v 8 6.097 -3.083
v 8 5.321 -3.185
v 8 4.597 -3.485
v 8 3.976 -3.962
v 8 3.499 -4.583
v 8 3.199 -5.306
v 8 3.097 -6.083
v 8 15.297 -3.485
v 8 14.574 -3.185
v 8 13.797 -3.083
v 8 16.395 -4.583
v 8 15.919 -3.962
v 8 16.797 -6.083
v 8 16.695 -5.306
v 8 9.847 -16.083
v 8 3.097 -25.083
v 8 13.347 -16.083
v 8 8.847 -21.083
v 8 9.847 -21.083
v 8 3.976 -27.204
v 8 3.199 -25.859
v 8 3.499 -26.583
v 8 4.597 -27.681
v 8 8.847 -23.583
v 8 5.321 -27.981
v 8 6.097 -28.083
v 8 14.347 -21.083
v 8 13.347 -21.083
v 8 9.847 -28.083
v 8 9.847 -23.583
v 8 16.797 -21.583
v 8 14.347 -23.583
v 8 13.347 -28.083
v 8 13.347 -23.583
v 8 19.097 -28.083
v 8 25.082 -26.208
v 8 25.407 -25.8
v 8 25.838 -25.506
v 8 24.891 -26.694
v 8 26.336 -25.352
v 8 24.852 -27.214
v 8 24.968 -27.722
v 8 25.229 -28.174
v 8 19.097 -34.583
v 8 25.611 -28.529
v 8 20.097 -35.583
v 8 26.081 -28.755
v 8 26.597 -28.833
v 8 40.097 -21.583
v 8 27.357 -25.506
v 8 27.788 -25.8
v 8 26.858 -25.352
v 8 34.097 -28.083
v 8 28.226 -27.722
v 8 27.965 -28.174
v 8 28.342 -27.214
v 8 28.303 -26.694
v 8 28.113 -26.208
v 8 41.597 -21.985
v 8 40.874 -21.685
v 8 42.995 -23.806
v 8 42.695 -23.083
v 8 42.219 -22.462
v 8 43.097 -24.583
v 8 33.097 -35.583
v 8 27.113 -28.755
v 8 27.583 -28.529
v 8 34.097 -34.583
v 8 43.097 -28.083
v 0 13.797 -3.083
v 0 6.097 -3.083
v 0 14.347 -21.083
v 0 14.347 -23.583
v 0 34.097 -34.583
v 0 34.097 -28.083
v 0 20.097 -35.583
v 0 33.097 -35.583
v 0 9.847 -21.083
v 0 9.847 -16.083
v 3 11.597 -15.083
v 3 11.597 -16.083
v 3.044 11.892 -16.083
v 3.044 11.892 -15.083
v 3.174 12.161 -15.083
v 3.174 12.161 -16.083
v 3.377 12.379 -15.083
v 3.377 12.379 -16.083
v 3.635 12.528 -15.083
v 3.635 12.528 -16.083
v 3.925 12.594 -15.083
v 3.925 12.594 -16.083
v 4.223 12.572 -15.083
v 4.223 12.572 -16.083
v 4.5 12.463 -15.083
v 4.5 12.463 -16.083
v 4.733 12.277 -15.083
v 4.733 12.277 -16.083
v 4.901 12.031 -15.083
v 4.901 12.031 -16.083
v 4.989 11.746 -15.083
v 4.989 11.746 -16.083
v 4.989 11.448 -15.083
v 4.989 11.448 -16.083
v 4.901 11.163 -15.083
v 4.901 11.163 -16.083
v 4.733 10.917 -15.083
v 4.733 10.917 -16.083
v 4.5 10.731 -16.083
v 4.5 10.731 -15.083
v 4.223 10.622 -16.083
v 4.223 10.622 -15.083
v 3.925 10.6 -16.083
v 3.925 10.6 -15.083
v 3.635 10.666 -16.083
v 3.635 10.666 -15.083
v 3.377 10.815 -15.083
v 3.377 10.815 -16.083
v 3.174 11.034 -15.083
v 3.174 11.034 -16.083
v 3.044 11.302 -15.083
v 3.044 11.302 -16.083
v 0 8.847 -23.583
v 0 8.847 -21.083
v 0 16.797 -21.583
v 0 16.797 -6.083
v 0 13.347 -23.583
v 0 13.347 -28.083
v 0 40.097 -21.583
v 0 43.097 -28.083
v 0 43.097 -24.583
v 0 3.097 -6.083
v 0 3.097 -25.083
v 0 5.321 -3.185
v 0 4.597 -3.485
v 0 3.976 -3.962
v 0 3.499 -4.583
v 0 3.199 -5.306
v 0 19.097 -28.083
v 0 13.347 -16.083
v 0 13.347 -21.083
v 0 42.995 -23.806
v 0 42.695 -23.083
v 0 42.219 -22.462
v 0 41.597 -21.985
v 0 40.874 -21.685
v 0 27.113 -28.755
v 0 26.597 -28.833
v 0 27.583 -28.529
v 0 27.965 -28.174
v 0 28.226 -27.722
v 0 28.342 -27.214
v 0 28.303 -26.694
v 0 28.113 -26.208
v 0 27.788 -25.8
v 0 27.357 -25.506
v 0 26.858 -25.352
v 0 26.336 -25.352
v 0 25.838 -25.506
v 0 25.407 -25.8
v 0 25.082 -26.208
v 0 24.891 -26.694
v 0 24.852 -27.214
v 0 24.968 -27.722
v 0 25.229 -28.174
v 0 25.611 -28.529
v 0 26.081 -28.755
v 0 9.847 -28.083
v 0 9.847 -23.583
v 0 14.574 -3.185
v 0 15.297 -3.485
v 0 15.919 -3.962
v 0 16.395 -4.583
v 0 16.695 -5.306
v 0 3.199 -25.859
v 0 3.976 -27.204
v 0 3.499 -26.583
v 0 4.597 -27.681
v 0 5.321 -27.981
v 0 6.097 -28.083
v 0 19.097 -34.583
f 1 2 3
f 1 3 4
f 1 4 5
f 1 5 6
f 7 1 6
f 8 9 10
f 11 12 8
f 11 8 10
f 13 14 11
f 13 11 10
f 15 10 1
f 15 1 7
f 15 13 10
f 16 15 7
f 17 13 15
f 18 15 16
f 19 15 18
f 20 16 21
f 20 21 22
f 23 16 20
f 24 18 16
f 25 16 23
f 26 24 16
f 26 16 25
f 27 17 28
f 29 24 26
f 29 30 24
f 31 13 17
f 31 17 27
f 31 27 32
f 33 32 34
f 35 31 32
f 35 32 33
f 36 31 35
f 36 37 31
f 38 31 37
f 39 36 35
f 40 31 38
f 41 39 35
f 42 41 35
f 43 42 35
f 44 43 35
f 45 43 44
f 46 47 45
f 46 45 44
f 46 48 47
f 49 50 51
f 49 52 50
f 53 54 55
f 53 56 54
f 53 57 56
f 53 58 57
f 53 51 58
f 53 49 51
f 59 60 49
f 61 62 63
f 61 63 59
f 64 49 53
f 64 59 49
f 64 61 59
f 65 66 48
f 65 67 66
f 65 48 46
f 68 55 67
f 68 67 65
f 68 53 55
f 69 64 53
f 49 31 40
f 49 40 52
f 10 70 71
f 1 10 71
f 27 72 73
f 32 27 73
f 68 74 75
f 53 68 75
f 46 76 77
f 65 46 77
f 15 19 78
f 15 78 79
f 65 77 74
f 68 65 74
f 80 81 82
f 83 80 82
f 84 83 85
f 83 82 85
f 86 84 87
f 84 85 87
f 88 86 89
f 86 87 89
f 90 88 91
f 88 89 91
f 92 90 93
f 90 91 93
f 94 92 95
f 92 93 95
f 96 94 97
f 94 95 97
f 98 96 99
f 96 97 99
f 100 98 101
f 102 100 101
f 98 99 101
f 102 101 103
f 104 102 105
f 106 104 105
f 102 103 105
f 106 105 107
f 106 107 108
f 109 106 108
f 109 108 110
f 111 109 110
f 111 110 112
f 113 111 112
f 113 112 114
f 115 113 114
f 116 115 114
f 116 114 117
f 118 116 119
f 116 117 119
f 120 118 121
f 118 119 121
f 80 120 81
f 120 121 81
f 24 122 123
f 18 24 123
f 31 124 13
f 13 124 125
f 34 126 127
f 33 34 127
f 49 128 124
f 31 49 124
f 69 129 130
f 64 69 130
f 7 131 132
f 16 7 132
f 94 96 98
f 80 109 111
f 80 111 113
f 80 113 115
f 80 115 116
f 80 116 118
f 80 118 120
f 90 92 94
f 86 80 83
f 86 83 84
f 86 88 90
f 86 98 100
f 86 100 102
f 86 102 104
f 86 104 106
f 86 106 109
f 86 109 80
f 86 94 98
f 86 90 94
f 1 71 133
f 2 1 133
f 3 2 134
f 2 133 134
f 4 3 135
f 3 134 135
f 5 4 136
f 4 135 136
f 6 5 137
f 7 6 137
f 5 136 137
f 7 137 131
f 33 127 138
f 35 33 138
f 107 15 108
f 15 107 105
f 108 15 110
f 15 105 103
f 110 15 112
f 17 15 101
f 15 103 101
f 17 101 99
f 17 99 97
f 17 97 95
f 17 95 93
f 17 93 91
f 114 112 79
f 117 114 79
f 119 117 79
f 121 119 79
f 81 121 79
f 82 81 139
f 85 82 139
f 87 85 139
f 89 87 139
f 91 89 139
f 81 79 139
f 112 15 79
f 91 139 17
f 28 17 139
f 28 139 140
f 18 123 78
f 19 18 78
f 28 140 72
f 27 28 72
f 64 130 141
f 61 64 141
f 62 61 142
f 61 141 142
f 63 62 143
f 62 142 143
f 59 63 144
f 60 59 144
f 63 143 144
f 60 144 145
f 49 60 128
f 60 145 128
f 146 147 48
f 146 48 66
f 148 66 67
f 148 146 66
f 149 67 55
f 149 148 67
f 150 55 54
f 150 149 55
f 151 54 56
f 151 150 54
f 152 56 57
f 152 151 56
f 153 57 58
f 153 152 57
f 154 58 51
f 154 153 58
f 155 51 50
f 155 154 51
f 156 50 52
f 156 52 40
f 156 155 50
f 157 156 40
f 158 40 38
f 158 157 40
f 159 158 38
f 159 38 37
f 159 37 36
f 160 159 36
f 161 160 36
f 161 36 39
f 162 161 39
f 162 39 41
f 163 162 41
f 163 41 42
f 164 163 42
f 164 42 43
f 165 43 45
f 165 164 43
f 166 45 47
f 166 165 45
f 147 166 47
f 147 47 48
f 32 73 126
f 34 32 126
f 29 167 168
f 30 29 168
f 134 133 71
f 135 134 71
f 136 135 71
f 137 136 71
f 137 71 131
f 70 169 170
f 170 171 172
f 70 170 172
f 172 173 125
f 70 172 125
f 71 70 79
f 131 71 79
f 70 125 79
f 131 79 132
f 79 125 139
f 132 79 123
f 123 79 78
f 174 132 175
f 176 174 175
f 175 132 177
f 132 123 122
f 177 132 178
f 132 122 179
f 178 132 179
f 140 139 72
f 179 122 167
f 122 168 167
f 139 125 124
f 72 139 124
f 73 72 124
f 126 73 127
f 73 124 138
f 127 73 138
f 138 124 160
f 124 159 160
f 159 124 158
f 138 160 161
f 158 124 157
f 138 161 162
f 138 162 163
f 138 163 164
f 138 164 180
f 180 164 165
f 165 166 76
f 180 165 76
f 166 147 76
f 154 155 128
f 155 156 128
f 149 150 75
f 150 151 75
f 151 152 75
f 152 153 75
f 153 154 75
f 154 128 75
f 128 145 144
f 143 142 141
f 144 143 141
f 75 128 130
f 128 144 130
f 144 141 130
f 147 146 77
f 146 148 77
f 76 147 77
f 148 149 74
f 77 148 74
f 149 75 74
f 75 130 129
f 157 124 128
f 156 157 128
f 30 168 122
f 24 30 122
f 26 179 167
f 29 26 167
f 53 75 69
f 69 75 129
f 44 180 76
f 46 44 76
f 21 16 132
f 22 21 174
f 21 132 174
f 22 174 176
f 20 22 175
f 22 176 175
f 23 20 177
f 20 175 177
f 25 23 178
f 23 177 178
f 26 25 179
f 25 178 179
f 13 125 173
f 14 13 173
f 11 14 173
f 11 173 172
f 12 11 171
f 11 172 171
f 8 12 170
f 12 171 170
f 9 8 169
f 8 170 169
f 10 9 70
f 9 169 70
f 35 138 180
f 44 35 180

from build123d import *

# Parameters (mm, degrees)
SKETCH1_R      = 1.75
EXTRUDE1_DEPTH = 8
SKETCH2_R      = 1
EXTRUDE2_DEPTH = 1


with BuildPart() as part:
    # Sketch1 → Extrude1 (new body)
    with BuildSketch(Plane(origin=(0, 0, 0), x_dir=(0, 0, -1), z_dir=(1, 0, 0))):
        with BuildLine():
            Line((28.082940188, 19.097217002), (34.582940188, 19.097217002))
            Line((34.582940188, 19.097217002), (35.582940188, 20.097217002))
            Line((35.582940188, 20.097217002), (35.582940188, 33.097217002))
            Line((35.582940188, 33.097217002), (34.582940188, 34.097217002))
            Line((34.582940188, 34.097217002), (28.082940188, 34.097217002))
            Line((28.082940188, 34.097217002), (28.082940188, 43.097217002))
            Line((28.082940188, 43.097217002), (24.582940188, 43.097217002))
            ThreePointArc((24.582940188, 43.097217002), (22.461619844, 42.218537346), (21.582940188, 40.097217002))
            Line((21.582940188, 40.097217002), (21.582940188, 16.797217002))
            Line((21.582940188, 16.797217002), (6.082940188, 16.797217002))
            ThreePointArc((6.082940188, 16.797217002), (3.961619844, 15.918537346), (3.082940188, 13.797217002))
            Line((3.082940188, 13.797217002), (3.082940188, 6.097217002))
            ThreePointArc((3.082940188, 6.097217002), (3.961619844, 3.975896659), (6.082940188, 3.097217002))
            Line((6.082940188, 3.097217002), (25.082940188, 3.097217002))
            ThreePointArc((25.082940188, 3.097217002), (27.204260531, 3.975896659), (28.082940188, 6.097217002))
            Line((28.082940188, 6.097217002), (28.082940188, 9.847217002))
            Line((28.082940188, 9.847217002), (23.582940188, 9.847217002))
            Line((23.582940188, 9.847217002), (23.582940188, 8.847217002))
            Line((23.582940188, 8.847217002), (21.082940188, 8.847217002))
            Line((21.082940188, 8.847217002), (21.082940188, 9.847217002))
            Line((21.082940188, 9.847217002), (16.082940188, 9.847217002))
            Line((16.082940188, 9.847217002), (16.082940188, 13.347217002))
            Line((16.082940188, 13.347217002), (21.082940188, 13.347217002))
            Line((21.082940188, 13.347217002), (21.082940188, 14.347217002))
            Line((21.082940188, 14.347217002), (23.582940188, 14.347217002))
            Line((23.582940188, 14.347217002), (23.582940188, 13.347217002))
            Line((23.582940188, 13.347217002), (28.082940188, 13.347217002))
            Line((28.082940188, 13.347217002), (28.082940188, 19.097217002))
        make_face()
        with Locations((27.082940188, 26.597217002)):
            Circle(SKETCH1_R, mode=Mode.SUBTRACT)
    extrude(amount=EXTRUDE1_DEPTH)

    # Sketch2 → Extrude2 (cut)
    with BuildSketch(Plane(origin=(0, 0, -16.082940188), x_dir=(-1, 0, 0), z_dir=(0, 0, -1))):
        with Locations((-4, 11.597217002)):
            Circle(SKETCH2_R)
    extrude(amount=-EXTRUDE2_DEPTH, mode=Mode.SUBTRACT)


solid = part.part
